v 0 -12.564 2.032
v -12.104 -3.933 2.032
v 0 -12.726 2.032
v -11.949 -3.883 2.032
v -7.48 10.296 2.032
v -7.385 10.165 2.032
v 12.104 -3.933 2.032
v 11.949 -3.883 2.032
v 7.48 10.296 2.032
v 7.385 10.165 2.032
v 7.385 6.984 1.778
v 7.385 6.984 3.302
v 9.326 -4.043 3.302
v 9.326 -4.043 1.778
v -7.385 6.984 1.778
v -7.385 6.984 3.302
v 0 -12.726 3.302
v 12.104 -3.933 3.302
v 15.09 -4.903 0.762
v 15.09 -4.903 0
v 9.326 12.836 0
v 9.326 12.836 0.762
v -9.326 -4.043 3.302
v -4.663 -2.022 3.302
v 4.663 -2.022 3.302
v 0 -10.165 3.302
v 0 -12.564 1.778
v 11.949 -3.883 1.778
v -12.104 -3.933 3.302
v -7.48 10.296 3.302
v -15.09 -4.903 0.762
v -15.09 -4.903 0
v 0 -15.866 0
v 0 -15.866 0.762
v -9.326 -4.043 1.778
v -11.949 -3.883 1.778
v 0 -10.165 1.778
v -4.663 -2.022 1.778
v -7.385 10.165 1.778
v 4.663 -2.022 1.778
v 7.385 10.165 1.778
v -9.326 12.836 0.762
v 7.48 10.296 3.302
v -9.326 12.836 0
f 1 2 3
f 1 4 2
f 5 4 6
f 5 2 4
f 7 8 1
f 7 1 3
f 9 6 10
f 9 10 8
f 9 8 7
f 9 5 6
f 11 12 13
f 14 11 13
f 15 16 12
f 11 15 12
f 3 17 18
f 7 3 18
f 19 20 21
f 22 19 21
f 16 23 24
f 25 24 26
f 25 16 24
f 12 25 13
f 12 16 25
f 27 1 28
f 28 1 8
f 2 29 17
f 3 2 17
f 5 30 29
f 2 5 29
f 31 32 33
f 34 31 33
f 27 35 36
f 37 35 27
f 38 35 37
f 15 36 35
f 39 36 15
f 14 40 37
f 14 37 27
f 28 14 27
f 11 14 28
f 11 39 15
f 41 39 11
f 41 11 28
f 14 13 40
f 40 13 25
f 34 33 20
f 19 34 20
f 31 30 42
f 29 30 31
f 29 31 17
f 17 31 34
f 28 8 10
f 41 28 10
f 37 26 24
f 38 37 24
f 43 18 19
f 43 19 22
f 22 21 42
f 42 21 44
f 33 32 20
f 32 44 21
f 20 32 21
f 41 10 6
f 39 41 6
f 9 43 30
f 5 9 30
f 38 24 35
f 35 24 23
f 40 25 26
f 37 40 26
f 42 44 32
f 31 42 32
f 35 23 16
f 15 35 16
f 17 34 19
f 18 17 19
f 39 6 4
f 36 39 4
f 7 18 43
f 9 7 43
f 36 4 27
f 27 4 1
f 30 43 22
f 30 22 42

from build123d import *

# Parameters (mm, degrees)
F1_DEPTH = 3.302
F3_DEPTH = 1.524
F4_SIZE  = 2.54
F5_DEPTH = 1.27


with BuildPart() as f1:
    # F0 (on Top) → F1 (new body)
    with BuildSketch(Plane.XY):
        Polygon((9.3258451213, 12.835924618), (-9.3258451213, 12.835924618), (-15.08953438, -4.9028869271), (0, -15.866075382), (15.08953438, -4.9028869271), align=None)
    extrude(amount=F1_DEPTH)

    # F2 (on face) → F3 (cut)
    with BuildSketch(Plane.XY.offset(3.302)):
        Polygon((7.3849782182, 10.1645505026), (-7.3849782182, 10.1645505026), (-11.9491457632, -3.8825128116), (0, -12.564075382), (11.9491457632, -3.8825128116), align=None)
        Polygon((-9.3258451213, -4.0431052044), (-7.3849782182, 6.9842811825), (0, 6.9842811825), (7.3849782182, 6.9842811825), (9.3258451213, -4.0431052044), (4.6629225606, -2.0215526022), (0, -10.1645505026), (-4.6629225606, -2.0215526022), align=None, mode=Mode.SUBTRACT)
    extrude(amount=-F3_DEPTH, mode=Mode.SUBTRACT)

    # F4
    f4_edges = [f1.edges().sort_by_distance(p)[0] for p in [
        (7.544767, -10.384481, 3.302),
        (-7.544767, -10.384481, 3.302),
        (-12.20769, 3.966519, 3.302),
        (0, 12.835925, 3.302),
        (12.20769, 3.966519, 3.302),
    ]]
    chamfer(f4_edges, length=F4_SIZE)

    # F5 (cut): a face of the model
    f5_faces = [f1.faces().sort_by_distance(p)[0] for p in [
        (6.0321565972, -8.3025512818, 3.302),
    ]]
    extrude(f5_faces, amount=-F5_DEPTH, mode=Mode.SUBTRACT)


solid = f1.part
